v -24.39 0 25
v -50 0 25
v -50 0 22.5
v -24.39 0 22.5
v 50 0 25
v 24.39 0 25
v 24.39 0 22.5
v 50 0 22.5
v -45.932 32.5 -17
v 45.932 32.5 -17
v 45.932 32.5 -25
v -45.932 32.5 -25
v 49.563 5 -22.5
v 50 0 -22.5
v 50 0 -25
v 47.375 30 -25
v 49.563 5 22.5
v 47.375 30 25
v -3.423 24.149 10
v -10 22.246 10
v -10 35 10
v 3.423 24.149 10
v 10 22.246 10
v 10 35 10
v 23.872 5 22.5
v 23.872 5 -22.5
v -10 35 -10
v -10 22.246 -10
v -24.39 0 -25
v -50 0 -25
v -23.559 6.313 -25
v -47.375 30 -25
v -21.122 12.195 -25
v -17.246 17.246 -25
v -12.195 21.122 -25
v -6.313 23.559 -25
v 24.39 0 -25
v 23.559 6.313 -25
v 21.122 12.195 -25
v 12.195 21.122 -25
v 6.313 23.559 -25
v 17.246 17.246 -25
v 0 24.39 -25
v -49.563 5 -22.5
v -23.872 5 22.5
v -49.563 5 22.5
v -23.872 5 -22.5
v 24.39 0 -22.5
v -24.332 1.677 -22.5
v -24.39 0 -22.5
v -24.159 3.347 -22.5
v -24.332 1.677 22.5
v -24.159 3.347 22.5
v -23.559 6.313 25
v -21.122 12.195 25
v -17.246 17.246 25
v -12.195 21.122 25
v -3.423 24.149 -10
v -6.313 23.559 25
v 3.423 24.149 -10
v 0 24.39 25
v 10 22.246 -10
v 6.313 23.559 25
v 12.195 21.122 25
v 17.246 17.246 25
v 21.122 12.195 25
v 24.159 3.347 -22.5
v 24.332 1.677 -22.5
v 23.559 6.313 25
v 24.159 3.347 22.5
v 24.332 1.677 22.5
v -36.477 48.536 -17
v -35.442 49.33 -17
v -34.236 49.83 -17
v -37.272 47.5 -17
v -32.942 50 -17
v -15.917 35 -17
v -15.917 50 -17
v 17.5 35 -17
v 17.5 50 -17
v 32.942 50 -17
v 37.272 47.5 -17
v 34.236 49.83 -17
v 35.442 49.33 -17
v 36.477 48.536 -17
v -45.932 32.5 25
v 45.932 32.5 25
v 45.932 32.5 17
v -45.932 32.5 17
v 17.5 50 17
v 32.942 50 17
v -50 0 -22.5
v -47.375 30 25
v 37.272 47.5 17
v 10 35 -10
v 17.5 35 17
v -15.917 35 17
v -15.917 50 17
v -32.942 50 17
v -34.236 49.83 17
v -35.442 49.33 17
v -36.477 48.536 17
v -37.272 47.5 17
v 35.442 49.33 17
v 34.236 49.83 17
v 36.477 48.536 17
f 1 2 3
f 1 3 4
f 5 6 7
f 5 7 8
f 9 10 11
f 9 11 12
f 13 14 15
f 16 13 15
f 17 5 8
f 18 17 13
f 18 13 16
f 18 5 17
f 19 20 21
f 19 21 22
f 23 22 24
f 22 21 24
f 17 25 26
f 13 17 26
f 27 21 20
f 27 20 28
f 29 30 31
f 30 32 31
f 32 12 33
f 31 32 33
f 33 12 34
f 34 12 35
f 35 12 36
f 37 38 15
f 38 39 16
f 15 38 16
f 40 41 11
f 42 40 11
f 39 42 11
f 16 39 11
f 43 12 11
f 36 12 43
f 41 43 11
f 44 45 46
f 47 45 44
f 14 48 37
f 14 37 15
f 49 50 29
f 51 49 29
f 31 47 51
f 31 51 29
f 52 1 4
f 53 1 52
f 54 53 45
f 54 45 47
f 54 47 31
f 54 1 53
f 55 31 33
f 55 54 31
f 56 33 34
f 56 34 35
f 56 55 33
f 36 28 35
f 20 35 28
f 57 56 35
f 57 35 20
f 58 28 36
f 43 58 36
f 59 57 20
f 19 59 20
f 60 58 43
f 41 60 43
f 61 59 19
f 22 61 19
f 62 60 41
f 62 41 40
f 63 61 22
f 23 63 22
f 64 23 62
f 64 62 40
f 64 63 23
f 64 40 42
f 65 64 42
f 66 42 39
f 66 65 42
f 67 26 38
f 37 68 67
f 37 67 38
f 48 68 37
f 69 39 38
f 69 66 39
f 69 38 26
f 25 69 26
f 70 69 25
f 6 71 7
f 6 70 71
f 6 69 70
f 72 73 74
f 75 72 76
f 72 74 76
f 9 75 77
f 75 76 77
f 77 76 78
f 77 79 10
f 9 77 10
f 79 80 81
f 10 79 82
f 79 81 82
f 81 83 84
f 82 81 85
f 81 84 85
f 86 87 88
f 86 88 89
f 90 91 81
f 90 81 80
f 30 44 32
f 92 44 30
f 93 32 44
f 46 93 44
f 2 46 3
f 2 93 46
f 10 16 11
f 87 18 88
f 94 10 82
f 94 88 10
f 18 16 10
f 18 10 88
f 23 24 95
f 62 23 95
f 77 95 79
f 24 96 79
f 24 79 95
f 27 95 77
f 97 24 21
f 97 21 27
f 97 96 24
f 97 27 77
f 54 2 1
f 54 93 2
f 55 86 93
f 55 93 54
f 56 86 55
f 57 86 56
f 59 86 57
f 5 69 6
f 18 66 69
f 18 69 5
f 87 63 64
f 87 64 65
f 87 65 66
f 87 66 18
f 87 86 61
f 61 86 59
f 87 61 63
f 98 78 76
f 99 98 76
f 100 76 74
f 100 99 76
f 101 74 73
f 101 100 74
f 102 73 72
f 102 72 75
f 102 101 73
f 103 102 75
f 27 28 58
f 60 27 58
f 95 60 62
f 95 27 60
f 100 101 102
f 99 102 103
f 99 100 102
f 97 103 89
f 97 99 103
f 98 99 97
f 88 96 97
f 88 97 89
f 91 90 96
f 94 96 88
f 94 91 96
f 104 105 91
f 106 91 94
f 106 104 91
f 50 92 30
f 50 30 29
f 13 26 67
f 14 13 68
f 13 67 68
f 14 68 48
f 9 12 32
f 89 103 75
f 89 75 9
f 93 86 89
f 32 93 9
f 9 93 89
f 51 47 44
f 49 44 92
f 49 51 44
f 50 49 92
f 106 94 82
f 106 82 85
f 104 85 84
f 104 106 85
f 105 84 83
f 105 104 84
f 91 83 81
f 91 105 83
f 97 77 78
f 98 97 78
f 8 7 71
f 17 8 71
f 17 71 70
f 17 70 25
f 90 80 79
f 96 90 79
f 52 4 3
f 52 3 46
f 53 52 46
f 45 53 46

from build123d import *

# Parameters (mm, degrees)
BOSS_EXTRUDE2_DEPTH     = 25
BOSS_EXTRUDE3_DEPTH     = 17
SKETCH3_W               = 20
SKETCH3_H               = 20
CUT_EXTRUDE1_DEPTH      = 16
CUT_EXTRUDE1_DEPTH_BACK = 36
CUT_EXTRUDE2_DEPTH      = 51
CUT_EXTRUDE2_DEPTH_BACK = 51


with BuildPart() as part:
    # Sketch1 → Boss-Extrude2 (new body, symmetric)
    with BuildSketch(Plane.XY):
        with BuildLine():
            Line((-50, 0), (-24.39, 0))
            ThreePointArc((-24.39, 0), (0, 24.39), (24.39, 0))
            Line((24.39, 0), (50, 0))
            Line((50, 0), (47.375340094, 30))
            Line((47.375340094, 30), (45.931964421, 32.5))
            Line((45.931964421, 32.5), (-45.931964421, 32.5))
            Line((-45.931964421, 32.5), (-47.375340094, 30))
            Line((-47.375340094, 30), (-50, 0))
        make_face()
    extrude(amount=BOSS_EXTRUDE2_DEPTH, both=True)

    # Sketch1<7> → Boss-Extrude3 (add, symmetric)
    with BuildSketch(Plane.XY):
        with BuildLine():
            Line((-37.271710383, 47.5), (-45.931964421, 32.5))
            Line((-45.931964421, 32.5), (45.931964421, 32.5))
            Line((45.931964421, 32.5), (37.271710383, 47.5))
            ThreePointArc((37.271710383, 47.5), (35.441583364, 49.330127019), (32.941583364, 50))
            Line((32.941583364, 50), (17.5, 50))
            Line((17.5, 50), (17.5, 35))
            Line((17.5, 35), (-15.917158097, 35))
            Line((-15.917158097, 35), (-15.917158097, 50))
            Line((-15.917158097, 50), (-32.941583364, 50))
            ThreePointArc((-32.941583364, 50), (-35.441583364, 49.330127019), (-37.271710383, 47.5))
        make_face()
    extrude(amount=BOSS_EXTRUDE3_DEPTH, both=True)

    # Sketch3 → Cut-Extrude1 (cut, two sides)
    with BuildSketch(Plane(origin=(0, 35, 0), x_dir=(1, 0, 0), z_dir=(0, 1, 0))) as cut_extrude1_sk:
        Rectangle(SKETCH3_W, SKETCH3_H)
    extrude(amount=CUT_EXTRUDE1_DEPTH, mode=Mode.SUBTRACT)
    extrude(cut_extrude1_sk.sketch, amount=-CUT_EXTRUDE1_DEPTH_BACK, mode=Mode.SUBTRACT)

    # Sketch5 → Cut-Extrude2 (cut, two sides)
    with BuildSketch(Plane(origin=(0, 0, 0), x_dir=(0, 0, -1), z_dir=(1, 0, 0))) as cut_extrude2_sk:
        Polygon((-176.421356237, 0), (-25, 0), (-22.5, 0), (-22.5, 5), (22.5, 5), (22.5, 0), (25, 0), (176.421356237, 0), (176.421356237, -302.842712475), (-176.421356237, -302.842712475), align=None)
    extrude(amount=CUT_EXTRUDE2_DEPTH, mode=Mode.SUBTRACT)
    extrude(cut_extrude2_sk.sketch, amount=-CUT_EXTRUDE2_DEPTH_BACK, mode=Mode.SUBTRACT)


solid = part.part
